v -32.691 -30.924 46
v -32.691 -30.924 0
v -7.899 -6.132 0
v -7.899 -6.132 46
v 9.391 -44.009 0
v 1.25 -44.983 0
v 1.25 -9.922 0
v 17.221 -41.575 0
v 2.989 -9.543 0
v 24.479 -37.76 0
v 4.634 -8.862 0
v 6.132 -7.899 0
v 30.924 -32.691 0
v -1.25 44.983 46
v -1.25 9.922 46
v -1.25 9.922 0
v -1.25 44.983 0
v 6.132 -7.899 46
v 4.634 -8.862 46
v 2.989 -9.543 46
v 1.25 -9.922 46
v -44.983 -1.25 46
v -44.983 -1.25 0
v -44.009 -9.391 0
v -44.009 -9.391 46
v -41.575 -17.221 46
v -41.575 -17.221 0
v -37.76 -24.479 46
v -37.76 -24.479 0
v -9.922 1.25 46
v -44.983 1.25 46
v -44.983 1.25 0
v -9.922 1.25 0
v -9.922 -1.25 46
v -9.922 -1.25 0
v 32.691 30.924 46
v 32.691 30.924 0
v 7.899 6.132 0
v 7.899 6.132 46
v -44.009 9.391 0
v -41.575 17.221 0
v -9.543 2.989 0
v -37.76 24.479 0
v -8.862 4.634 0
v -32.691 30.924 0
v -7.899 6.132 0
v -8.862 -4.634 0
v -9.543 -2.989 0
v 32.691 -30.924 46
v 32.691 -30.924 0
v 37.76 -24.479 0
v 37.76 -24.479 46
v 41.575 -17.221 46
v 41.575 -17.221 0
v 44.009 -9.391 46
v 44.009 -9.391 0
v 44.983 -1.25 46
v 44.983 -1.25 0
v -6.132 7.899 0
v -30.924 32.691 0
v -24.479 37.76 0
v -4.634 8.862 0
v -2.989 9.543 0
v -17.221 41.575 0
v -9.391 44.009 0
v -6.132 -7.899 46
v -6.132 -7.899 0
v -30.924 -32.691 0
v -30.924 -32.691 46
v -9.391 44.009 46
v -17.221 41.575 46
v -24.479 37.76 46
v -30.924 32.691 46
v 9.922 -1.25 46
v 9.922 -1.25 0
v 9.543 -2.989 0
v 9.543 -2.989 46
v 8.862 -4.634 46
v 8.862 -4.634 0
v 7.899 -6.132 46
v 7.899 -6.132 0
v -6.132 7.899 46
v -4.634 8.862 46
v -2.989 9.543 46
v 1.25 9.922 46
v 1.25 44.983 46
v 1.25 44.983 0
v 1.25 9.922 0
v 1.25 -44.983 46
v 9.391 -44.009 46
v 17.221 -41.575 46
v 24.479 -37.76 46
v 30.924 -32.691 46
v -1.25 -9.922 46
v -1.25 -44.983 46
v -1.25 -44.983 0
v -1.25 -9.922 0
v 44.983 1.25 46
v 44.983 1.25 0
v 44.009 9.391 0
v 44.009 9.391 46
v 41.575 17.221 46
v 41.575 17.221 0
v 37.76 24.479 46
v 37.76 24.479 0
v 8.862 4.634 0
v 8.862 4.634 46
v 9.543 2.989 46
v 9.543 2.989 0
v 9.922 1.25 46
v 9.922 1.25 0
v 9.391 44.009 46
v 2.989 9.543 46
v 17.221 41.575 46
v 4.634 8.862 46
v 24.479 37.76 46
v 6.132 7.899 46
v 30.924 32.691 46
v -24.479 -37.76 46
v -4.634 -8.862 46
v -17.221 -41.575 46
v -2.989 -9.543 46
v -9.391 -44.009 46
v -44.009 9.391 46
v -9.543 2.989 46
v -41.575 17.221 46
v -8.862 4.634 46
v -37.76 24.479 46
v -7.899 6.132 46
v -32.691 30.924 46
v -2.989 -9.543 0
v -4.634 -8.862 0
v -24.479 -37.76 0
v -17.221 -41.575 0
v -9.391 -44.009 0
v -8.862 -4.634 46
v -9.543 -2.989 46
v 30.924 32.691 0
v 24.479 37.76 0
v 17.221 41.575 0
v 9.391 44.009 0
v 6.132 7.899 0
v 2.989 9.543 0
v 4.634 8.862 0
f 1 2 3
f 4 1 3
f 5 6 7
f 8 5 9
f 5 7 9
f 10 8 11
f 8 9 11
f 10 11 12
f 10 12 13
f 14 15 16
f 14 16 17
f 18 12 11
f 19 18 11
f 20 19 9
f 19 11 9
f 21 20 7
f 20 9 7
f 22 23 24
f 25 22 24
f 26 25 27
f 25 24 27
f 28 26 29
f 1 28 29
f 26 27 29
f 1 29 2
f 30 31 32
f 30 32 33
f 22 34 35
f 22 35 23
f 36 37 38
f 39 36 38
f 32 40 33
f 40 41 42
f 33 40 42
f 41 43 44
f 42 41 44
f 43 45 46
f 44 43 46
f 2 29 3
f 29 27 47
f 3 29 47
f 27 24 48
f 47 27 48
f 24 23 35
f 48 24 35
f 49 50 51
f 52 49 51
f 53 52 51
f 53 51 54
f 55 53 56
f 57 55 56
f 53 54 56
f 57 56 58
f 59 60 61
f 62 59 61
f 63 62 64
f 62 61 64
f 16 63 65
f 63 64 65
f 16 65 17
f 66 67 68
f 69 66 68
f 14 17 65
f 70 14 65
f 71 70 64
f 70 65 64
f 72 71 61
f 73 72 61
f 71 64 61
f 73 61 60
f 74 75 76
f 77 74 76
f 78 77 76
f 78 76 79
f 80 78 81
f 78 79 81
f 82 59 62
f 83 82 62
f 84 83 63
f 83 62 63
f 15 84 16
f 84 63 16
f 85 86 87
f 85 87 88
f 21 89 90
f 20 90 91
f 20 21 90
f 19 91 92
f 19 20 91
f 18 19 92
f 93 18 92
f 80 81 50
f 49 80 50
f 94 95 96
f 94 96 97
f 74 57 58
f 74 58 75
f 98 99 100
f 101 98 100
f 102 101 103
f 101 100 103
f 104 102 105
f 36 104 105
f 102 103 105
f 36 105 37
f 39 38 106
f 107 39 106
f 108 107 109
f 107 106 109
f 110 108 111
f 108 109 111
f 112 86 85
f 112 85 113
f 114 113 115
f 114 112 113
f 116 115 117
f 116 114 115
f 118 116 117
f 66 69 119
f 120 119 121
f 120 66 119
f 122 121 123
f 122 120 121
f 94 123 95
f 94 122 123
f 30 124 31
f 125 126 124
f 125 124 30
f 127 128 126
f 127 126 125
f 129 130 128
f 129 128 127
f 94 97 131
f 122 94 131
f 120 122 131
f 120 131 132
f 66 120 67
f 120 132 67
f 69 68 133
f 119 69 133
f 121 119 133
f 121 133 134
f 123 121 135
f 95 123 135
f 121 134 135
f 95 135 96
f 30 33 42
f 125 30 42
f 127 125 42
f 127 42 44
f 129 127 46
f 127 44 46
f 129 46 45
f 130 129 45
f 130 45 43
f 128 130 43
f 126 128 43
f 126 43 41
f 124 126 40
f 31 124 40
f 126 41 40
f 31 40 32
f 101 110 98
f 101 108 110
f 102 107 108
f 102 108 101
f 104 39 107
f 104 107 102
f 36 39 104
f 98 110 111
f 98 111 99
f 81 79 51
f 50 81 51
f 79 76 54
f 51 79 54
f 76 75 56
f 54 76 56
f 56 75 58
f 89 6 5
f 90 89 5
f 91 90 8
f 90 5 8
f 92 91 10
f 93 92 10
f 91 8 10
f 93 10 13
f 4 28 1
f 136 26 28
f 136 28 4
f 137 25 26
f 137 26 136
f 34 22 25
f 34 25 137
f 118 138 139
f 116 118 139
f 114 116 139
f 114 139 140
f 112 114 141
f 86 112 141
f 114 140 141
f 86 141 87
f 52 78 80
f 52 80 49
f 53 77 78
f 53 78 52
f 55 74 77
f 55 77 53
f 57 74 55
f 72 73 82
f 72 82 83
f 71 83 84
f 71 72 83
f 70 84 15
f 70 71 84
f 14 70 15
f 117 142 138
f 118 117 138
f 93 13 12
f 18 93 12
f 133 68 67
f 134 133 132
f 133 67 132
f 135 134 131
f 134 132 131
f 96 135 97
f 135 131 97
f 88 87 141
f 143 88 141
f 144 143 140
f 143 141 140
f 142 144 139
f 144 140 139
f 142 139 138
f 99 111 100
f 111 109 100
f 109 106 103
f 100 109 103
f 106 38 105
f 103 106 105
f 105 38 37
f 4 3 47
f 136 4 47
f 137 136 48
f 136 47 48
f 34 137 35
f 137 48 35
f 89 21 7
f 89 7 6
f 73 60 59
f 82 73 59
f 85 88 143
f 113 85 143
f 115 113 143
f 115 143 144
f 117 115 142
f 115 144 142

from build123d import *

# Parameters (mm, degrees)
F1_DEPTH = 46


with BuildPart() as f1:
    # F0 (on Top) → F1 (new body)
    with BuildSketch(Plane.XY):
        with BuildLine():
            Line((-1.25, 9.9215674165), (-1.25, 44.9826355386))
            ThreePointArc((-1.25, 44.9826355386), (-17.2207544564, 41.574578963), (-30.9236431485, 32.6914101015))
            Line((-30.9236431485, 32.6914101015), (-6.1317241237, 7.8994910767))
            ThreePointArc((-6.1317241237, 7.8994910767), (-3.8268343237, 9.2387953251), (-1.25, 9.9215674165))
        make_face()
    extrude(amount=F1_DEPTH)


with BuildPart() as f1b:
    # F0 (on Top) → F1, piece 2 (new body)
    with BuildSketch(Plane.XY):
        with BuildLine():
            Line((-7.8994910767, 6.1317241237), (-32.6914101015, 30.9236431485))
            ThreePointArc((-32.6914101015, 30.9236431485), (-41.574578963, 17.2207544564), (-44.9826355386, 1.25))
            Line((-44.9826355386, 1.25), (-9.9215674165, 1.25))
            ThreePointArc((-9.9215674165, 1.25), (-9.2387953251, 3.8268343237), (-7.8994910767, 6.1317241237))
        make_face()
    extrude(amount=F1_DEPTH)


with BuildPart() as f1c:
    # F0 (on Top) → F1, piece 3 (new body)
    with BuildSketch(Plane.XY):
        with BuildLine():
            ThreePointArc((-44.9826355386, -1.25), (-41.574578963, -17.2207544564), (-32.6914101015, -30.9236431485))
            Line((-32.6914101015, -30.9236431485), (-7.8994910767, -6.1317241237))
            ThreePointArc((-7.8994910767, -6.1317241237), (-9.2387953251, -3.8268343237), (-9.9215674165, -1.25))
            Line((-9.9215674165, -1.25), (-44.9826355386, -1.25))
        make_face()
    extrude(amount=F1_DEPTH)


with BuildPart() as f1d:
    # F0 (on Top) → F1, piece 4 (new body)
    with BuildSketch(Plane.XY):
        with BuildLine():
            ThreePointArc((-30.9236431485, -32.6914101015), (-17.2207544564, -41.574578963), (-1.25, -44.9826355386))
            Line((-1.25, -44.9826355386), (-1.25, -9.9215674165))
            ThreePointArc((-1.25, -9.9215674165), (-3.8268343237, -9.2387953251), (-6.1317241237, -7.8994910767))
            Line((-6.1317241237, -7.8994910767), (-30.9236431485, -32.6914101015))
        make_face()
    extrude(amount=F1_DEPTH)


with BuildPart() as f1e:
    # F0 (on Top) → F1, piece 5 (new body)
    with BuildSketch(Plane.XY):
        with BuildLine():
            ThreePointArc((1.25, -44.9826355386), (17.2207544564, -41.574578963), (30.9236431485, -32.6914101015))
            Line((30.9236431485, -32.6914101015), (6.1317241237, -7.8994910767))
            ThreePointArc((6.1317241237, -7.8994910767), (3.8268343237, -9.2387953251), (1.25, -9.9215674165))
            Line((1.25, -9.9215674165), (1.25, -44.9826355386))
        make_face()
    extrude(amount=F1_DEPTH)


with BuildPart() as f1f:
    # F0 (on Top) → F1, piece 6 (new body)
    with BuildSketch(Plane.XY):
        with BuildLine():
            ThreePointArc((32.6914101015, -30.9236431485), (41.574578963, -17.2207544564), (44.9826355386, -1.25))
            Line((44.9826355386, -1.25), (9.9215674165, -1.25))
            ThreePointArc((9.9215674165, -1.25), (9.2387953251, -3.8268343237), (7.8994910767, -6.1317241237))
            Line((7.8994910767, -6.1317241237), (32.6914101015, -30.9236431485))
        make_face()
    extrude(amount=F1_DEPTH)


with BuildPart() as f1g:
    # F0 (on Top) → F1, piece 7 (new body)
    with BuildSketch(Plane.XY):
        with BuildLine():
            Line((9.9215674165, 1.25), (44.9826355386, 1.25))
            ThreePointArc((44.9826355386, 1.25), (41.574578963, 17.2207544564), (32.6914101015, 30.9236431485))
            Line((32.6914101015, 30.9236431485), (7.8994910767, 6.1317241237))
            ThreePointArc((7.8994910767, 6.1317241237), (9.2387953251, 3.8268343237), (9.9215674165, 1.25))
        make_face()
    extrude(amount=F1_DEPTH)


with BuildPart() as f1h:
    # F0 (on Top) → F1, piece 8 (new body)
    with BuildSketch(Plane.XY):
        with BuildLine():
            Line((6.1317241237, 7.8994910767), (30.9236431485, 32.6914101015))
            ThreePointArc((30.9236431485, 32.6914101015), (17.2207544564, 41.574578963), (1.25, 44.9826355386))
            Line((1.25, 44.9826355386), (1.25, 9.9215674165))
            ThreePointArc((1.25, 9.9215674165), (3.8268343237, 9.2387953251), (6.1317241237, 7.8994910767))
        make_face()
    extrude(amount=F1_DEPTH)


solid = Compound([f1.part, f1b.part, f1c.part, f1d.part, f1e.part, f1f.part, f1g.part, f1h.part])
